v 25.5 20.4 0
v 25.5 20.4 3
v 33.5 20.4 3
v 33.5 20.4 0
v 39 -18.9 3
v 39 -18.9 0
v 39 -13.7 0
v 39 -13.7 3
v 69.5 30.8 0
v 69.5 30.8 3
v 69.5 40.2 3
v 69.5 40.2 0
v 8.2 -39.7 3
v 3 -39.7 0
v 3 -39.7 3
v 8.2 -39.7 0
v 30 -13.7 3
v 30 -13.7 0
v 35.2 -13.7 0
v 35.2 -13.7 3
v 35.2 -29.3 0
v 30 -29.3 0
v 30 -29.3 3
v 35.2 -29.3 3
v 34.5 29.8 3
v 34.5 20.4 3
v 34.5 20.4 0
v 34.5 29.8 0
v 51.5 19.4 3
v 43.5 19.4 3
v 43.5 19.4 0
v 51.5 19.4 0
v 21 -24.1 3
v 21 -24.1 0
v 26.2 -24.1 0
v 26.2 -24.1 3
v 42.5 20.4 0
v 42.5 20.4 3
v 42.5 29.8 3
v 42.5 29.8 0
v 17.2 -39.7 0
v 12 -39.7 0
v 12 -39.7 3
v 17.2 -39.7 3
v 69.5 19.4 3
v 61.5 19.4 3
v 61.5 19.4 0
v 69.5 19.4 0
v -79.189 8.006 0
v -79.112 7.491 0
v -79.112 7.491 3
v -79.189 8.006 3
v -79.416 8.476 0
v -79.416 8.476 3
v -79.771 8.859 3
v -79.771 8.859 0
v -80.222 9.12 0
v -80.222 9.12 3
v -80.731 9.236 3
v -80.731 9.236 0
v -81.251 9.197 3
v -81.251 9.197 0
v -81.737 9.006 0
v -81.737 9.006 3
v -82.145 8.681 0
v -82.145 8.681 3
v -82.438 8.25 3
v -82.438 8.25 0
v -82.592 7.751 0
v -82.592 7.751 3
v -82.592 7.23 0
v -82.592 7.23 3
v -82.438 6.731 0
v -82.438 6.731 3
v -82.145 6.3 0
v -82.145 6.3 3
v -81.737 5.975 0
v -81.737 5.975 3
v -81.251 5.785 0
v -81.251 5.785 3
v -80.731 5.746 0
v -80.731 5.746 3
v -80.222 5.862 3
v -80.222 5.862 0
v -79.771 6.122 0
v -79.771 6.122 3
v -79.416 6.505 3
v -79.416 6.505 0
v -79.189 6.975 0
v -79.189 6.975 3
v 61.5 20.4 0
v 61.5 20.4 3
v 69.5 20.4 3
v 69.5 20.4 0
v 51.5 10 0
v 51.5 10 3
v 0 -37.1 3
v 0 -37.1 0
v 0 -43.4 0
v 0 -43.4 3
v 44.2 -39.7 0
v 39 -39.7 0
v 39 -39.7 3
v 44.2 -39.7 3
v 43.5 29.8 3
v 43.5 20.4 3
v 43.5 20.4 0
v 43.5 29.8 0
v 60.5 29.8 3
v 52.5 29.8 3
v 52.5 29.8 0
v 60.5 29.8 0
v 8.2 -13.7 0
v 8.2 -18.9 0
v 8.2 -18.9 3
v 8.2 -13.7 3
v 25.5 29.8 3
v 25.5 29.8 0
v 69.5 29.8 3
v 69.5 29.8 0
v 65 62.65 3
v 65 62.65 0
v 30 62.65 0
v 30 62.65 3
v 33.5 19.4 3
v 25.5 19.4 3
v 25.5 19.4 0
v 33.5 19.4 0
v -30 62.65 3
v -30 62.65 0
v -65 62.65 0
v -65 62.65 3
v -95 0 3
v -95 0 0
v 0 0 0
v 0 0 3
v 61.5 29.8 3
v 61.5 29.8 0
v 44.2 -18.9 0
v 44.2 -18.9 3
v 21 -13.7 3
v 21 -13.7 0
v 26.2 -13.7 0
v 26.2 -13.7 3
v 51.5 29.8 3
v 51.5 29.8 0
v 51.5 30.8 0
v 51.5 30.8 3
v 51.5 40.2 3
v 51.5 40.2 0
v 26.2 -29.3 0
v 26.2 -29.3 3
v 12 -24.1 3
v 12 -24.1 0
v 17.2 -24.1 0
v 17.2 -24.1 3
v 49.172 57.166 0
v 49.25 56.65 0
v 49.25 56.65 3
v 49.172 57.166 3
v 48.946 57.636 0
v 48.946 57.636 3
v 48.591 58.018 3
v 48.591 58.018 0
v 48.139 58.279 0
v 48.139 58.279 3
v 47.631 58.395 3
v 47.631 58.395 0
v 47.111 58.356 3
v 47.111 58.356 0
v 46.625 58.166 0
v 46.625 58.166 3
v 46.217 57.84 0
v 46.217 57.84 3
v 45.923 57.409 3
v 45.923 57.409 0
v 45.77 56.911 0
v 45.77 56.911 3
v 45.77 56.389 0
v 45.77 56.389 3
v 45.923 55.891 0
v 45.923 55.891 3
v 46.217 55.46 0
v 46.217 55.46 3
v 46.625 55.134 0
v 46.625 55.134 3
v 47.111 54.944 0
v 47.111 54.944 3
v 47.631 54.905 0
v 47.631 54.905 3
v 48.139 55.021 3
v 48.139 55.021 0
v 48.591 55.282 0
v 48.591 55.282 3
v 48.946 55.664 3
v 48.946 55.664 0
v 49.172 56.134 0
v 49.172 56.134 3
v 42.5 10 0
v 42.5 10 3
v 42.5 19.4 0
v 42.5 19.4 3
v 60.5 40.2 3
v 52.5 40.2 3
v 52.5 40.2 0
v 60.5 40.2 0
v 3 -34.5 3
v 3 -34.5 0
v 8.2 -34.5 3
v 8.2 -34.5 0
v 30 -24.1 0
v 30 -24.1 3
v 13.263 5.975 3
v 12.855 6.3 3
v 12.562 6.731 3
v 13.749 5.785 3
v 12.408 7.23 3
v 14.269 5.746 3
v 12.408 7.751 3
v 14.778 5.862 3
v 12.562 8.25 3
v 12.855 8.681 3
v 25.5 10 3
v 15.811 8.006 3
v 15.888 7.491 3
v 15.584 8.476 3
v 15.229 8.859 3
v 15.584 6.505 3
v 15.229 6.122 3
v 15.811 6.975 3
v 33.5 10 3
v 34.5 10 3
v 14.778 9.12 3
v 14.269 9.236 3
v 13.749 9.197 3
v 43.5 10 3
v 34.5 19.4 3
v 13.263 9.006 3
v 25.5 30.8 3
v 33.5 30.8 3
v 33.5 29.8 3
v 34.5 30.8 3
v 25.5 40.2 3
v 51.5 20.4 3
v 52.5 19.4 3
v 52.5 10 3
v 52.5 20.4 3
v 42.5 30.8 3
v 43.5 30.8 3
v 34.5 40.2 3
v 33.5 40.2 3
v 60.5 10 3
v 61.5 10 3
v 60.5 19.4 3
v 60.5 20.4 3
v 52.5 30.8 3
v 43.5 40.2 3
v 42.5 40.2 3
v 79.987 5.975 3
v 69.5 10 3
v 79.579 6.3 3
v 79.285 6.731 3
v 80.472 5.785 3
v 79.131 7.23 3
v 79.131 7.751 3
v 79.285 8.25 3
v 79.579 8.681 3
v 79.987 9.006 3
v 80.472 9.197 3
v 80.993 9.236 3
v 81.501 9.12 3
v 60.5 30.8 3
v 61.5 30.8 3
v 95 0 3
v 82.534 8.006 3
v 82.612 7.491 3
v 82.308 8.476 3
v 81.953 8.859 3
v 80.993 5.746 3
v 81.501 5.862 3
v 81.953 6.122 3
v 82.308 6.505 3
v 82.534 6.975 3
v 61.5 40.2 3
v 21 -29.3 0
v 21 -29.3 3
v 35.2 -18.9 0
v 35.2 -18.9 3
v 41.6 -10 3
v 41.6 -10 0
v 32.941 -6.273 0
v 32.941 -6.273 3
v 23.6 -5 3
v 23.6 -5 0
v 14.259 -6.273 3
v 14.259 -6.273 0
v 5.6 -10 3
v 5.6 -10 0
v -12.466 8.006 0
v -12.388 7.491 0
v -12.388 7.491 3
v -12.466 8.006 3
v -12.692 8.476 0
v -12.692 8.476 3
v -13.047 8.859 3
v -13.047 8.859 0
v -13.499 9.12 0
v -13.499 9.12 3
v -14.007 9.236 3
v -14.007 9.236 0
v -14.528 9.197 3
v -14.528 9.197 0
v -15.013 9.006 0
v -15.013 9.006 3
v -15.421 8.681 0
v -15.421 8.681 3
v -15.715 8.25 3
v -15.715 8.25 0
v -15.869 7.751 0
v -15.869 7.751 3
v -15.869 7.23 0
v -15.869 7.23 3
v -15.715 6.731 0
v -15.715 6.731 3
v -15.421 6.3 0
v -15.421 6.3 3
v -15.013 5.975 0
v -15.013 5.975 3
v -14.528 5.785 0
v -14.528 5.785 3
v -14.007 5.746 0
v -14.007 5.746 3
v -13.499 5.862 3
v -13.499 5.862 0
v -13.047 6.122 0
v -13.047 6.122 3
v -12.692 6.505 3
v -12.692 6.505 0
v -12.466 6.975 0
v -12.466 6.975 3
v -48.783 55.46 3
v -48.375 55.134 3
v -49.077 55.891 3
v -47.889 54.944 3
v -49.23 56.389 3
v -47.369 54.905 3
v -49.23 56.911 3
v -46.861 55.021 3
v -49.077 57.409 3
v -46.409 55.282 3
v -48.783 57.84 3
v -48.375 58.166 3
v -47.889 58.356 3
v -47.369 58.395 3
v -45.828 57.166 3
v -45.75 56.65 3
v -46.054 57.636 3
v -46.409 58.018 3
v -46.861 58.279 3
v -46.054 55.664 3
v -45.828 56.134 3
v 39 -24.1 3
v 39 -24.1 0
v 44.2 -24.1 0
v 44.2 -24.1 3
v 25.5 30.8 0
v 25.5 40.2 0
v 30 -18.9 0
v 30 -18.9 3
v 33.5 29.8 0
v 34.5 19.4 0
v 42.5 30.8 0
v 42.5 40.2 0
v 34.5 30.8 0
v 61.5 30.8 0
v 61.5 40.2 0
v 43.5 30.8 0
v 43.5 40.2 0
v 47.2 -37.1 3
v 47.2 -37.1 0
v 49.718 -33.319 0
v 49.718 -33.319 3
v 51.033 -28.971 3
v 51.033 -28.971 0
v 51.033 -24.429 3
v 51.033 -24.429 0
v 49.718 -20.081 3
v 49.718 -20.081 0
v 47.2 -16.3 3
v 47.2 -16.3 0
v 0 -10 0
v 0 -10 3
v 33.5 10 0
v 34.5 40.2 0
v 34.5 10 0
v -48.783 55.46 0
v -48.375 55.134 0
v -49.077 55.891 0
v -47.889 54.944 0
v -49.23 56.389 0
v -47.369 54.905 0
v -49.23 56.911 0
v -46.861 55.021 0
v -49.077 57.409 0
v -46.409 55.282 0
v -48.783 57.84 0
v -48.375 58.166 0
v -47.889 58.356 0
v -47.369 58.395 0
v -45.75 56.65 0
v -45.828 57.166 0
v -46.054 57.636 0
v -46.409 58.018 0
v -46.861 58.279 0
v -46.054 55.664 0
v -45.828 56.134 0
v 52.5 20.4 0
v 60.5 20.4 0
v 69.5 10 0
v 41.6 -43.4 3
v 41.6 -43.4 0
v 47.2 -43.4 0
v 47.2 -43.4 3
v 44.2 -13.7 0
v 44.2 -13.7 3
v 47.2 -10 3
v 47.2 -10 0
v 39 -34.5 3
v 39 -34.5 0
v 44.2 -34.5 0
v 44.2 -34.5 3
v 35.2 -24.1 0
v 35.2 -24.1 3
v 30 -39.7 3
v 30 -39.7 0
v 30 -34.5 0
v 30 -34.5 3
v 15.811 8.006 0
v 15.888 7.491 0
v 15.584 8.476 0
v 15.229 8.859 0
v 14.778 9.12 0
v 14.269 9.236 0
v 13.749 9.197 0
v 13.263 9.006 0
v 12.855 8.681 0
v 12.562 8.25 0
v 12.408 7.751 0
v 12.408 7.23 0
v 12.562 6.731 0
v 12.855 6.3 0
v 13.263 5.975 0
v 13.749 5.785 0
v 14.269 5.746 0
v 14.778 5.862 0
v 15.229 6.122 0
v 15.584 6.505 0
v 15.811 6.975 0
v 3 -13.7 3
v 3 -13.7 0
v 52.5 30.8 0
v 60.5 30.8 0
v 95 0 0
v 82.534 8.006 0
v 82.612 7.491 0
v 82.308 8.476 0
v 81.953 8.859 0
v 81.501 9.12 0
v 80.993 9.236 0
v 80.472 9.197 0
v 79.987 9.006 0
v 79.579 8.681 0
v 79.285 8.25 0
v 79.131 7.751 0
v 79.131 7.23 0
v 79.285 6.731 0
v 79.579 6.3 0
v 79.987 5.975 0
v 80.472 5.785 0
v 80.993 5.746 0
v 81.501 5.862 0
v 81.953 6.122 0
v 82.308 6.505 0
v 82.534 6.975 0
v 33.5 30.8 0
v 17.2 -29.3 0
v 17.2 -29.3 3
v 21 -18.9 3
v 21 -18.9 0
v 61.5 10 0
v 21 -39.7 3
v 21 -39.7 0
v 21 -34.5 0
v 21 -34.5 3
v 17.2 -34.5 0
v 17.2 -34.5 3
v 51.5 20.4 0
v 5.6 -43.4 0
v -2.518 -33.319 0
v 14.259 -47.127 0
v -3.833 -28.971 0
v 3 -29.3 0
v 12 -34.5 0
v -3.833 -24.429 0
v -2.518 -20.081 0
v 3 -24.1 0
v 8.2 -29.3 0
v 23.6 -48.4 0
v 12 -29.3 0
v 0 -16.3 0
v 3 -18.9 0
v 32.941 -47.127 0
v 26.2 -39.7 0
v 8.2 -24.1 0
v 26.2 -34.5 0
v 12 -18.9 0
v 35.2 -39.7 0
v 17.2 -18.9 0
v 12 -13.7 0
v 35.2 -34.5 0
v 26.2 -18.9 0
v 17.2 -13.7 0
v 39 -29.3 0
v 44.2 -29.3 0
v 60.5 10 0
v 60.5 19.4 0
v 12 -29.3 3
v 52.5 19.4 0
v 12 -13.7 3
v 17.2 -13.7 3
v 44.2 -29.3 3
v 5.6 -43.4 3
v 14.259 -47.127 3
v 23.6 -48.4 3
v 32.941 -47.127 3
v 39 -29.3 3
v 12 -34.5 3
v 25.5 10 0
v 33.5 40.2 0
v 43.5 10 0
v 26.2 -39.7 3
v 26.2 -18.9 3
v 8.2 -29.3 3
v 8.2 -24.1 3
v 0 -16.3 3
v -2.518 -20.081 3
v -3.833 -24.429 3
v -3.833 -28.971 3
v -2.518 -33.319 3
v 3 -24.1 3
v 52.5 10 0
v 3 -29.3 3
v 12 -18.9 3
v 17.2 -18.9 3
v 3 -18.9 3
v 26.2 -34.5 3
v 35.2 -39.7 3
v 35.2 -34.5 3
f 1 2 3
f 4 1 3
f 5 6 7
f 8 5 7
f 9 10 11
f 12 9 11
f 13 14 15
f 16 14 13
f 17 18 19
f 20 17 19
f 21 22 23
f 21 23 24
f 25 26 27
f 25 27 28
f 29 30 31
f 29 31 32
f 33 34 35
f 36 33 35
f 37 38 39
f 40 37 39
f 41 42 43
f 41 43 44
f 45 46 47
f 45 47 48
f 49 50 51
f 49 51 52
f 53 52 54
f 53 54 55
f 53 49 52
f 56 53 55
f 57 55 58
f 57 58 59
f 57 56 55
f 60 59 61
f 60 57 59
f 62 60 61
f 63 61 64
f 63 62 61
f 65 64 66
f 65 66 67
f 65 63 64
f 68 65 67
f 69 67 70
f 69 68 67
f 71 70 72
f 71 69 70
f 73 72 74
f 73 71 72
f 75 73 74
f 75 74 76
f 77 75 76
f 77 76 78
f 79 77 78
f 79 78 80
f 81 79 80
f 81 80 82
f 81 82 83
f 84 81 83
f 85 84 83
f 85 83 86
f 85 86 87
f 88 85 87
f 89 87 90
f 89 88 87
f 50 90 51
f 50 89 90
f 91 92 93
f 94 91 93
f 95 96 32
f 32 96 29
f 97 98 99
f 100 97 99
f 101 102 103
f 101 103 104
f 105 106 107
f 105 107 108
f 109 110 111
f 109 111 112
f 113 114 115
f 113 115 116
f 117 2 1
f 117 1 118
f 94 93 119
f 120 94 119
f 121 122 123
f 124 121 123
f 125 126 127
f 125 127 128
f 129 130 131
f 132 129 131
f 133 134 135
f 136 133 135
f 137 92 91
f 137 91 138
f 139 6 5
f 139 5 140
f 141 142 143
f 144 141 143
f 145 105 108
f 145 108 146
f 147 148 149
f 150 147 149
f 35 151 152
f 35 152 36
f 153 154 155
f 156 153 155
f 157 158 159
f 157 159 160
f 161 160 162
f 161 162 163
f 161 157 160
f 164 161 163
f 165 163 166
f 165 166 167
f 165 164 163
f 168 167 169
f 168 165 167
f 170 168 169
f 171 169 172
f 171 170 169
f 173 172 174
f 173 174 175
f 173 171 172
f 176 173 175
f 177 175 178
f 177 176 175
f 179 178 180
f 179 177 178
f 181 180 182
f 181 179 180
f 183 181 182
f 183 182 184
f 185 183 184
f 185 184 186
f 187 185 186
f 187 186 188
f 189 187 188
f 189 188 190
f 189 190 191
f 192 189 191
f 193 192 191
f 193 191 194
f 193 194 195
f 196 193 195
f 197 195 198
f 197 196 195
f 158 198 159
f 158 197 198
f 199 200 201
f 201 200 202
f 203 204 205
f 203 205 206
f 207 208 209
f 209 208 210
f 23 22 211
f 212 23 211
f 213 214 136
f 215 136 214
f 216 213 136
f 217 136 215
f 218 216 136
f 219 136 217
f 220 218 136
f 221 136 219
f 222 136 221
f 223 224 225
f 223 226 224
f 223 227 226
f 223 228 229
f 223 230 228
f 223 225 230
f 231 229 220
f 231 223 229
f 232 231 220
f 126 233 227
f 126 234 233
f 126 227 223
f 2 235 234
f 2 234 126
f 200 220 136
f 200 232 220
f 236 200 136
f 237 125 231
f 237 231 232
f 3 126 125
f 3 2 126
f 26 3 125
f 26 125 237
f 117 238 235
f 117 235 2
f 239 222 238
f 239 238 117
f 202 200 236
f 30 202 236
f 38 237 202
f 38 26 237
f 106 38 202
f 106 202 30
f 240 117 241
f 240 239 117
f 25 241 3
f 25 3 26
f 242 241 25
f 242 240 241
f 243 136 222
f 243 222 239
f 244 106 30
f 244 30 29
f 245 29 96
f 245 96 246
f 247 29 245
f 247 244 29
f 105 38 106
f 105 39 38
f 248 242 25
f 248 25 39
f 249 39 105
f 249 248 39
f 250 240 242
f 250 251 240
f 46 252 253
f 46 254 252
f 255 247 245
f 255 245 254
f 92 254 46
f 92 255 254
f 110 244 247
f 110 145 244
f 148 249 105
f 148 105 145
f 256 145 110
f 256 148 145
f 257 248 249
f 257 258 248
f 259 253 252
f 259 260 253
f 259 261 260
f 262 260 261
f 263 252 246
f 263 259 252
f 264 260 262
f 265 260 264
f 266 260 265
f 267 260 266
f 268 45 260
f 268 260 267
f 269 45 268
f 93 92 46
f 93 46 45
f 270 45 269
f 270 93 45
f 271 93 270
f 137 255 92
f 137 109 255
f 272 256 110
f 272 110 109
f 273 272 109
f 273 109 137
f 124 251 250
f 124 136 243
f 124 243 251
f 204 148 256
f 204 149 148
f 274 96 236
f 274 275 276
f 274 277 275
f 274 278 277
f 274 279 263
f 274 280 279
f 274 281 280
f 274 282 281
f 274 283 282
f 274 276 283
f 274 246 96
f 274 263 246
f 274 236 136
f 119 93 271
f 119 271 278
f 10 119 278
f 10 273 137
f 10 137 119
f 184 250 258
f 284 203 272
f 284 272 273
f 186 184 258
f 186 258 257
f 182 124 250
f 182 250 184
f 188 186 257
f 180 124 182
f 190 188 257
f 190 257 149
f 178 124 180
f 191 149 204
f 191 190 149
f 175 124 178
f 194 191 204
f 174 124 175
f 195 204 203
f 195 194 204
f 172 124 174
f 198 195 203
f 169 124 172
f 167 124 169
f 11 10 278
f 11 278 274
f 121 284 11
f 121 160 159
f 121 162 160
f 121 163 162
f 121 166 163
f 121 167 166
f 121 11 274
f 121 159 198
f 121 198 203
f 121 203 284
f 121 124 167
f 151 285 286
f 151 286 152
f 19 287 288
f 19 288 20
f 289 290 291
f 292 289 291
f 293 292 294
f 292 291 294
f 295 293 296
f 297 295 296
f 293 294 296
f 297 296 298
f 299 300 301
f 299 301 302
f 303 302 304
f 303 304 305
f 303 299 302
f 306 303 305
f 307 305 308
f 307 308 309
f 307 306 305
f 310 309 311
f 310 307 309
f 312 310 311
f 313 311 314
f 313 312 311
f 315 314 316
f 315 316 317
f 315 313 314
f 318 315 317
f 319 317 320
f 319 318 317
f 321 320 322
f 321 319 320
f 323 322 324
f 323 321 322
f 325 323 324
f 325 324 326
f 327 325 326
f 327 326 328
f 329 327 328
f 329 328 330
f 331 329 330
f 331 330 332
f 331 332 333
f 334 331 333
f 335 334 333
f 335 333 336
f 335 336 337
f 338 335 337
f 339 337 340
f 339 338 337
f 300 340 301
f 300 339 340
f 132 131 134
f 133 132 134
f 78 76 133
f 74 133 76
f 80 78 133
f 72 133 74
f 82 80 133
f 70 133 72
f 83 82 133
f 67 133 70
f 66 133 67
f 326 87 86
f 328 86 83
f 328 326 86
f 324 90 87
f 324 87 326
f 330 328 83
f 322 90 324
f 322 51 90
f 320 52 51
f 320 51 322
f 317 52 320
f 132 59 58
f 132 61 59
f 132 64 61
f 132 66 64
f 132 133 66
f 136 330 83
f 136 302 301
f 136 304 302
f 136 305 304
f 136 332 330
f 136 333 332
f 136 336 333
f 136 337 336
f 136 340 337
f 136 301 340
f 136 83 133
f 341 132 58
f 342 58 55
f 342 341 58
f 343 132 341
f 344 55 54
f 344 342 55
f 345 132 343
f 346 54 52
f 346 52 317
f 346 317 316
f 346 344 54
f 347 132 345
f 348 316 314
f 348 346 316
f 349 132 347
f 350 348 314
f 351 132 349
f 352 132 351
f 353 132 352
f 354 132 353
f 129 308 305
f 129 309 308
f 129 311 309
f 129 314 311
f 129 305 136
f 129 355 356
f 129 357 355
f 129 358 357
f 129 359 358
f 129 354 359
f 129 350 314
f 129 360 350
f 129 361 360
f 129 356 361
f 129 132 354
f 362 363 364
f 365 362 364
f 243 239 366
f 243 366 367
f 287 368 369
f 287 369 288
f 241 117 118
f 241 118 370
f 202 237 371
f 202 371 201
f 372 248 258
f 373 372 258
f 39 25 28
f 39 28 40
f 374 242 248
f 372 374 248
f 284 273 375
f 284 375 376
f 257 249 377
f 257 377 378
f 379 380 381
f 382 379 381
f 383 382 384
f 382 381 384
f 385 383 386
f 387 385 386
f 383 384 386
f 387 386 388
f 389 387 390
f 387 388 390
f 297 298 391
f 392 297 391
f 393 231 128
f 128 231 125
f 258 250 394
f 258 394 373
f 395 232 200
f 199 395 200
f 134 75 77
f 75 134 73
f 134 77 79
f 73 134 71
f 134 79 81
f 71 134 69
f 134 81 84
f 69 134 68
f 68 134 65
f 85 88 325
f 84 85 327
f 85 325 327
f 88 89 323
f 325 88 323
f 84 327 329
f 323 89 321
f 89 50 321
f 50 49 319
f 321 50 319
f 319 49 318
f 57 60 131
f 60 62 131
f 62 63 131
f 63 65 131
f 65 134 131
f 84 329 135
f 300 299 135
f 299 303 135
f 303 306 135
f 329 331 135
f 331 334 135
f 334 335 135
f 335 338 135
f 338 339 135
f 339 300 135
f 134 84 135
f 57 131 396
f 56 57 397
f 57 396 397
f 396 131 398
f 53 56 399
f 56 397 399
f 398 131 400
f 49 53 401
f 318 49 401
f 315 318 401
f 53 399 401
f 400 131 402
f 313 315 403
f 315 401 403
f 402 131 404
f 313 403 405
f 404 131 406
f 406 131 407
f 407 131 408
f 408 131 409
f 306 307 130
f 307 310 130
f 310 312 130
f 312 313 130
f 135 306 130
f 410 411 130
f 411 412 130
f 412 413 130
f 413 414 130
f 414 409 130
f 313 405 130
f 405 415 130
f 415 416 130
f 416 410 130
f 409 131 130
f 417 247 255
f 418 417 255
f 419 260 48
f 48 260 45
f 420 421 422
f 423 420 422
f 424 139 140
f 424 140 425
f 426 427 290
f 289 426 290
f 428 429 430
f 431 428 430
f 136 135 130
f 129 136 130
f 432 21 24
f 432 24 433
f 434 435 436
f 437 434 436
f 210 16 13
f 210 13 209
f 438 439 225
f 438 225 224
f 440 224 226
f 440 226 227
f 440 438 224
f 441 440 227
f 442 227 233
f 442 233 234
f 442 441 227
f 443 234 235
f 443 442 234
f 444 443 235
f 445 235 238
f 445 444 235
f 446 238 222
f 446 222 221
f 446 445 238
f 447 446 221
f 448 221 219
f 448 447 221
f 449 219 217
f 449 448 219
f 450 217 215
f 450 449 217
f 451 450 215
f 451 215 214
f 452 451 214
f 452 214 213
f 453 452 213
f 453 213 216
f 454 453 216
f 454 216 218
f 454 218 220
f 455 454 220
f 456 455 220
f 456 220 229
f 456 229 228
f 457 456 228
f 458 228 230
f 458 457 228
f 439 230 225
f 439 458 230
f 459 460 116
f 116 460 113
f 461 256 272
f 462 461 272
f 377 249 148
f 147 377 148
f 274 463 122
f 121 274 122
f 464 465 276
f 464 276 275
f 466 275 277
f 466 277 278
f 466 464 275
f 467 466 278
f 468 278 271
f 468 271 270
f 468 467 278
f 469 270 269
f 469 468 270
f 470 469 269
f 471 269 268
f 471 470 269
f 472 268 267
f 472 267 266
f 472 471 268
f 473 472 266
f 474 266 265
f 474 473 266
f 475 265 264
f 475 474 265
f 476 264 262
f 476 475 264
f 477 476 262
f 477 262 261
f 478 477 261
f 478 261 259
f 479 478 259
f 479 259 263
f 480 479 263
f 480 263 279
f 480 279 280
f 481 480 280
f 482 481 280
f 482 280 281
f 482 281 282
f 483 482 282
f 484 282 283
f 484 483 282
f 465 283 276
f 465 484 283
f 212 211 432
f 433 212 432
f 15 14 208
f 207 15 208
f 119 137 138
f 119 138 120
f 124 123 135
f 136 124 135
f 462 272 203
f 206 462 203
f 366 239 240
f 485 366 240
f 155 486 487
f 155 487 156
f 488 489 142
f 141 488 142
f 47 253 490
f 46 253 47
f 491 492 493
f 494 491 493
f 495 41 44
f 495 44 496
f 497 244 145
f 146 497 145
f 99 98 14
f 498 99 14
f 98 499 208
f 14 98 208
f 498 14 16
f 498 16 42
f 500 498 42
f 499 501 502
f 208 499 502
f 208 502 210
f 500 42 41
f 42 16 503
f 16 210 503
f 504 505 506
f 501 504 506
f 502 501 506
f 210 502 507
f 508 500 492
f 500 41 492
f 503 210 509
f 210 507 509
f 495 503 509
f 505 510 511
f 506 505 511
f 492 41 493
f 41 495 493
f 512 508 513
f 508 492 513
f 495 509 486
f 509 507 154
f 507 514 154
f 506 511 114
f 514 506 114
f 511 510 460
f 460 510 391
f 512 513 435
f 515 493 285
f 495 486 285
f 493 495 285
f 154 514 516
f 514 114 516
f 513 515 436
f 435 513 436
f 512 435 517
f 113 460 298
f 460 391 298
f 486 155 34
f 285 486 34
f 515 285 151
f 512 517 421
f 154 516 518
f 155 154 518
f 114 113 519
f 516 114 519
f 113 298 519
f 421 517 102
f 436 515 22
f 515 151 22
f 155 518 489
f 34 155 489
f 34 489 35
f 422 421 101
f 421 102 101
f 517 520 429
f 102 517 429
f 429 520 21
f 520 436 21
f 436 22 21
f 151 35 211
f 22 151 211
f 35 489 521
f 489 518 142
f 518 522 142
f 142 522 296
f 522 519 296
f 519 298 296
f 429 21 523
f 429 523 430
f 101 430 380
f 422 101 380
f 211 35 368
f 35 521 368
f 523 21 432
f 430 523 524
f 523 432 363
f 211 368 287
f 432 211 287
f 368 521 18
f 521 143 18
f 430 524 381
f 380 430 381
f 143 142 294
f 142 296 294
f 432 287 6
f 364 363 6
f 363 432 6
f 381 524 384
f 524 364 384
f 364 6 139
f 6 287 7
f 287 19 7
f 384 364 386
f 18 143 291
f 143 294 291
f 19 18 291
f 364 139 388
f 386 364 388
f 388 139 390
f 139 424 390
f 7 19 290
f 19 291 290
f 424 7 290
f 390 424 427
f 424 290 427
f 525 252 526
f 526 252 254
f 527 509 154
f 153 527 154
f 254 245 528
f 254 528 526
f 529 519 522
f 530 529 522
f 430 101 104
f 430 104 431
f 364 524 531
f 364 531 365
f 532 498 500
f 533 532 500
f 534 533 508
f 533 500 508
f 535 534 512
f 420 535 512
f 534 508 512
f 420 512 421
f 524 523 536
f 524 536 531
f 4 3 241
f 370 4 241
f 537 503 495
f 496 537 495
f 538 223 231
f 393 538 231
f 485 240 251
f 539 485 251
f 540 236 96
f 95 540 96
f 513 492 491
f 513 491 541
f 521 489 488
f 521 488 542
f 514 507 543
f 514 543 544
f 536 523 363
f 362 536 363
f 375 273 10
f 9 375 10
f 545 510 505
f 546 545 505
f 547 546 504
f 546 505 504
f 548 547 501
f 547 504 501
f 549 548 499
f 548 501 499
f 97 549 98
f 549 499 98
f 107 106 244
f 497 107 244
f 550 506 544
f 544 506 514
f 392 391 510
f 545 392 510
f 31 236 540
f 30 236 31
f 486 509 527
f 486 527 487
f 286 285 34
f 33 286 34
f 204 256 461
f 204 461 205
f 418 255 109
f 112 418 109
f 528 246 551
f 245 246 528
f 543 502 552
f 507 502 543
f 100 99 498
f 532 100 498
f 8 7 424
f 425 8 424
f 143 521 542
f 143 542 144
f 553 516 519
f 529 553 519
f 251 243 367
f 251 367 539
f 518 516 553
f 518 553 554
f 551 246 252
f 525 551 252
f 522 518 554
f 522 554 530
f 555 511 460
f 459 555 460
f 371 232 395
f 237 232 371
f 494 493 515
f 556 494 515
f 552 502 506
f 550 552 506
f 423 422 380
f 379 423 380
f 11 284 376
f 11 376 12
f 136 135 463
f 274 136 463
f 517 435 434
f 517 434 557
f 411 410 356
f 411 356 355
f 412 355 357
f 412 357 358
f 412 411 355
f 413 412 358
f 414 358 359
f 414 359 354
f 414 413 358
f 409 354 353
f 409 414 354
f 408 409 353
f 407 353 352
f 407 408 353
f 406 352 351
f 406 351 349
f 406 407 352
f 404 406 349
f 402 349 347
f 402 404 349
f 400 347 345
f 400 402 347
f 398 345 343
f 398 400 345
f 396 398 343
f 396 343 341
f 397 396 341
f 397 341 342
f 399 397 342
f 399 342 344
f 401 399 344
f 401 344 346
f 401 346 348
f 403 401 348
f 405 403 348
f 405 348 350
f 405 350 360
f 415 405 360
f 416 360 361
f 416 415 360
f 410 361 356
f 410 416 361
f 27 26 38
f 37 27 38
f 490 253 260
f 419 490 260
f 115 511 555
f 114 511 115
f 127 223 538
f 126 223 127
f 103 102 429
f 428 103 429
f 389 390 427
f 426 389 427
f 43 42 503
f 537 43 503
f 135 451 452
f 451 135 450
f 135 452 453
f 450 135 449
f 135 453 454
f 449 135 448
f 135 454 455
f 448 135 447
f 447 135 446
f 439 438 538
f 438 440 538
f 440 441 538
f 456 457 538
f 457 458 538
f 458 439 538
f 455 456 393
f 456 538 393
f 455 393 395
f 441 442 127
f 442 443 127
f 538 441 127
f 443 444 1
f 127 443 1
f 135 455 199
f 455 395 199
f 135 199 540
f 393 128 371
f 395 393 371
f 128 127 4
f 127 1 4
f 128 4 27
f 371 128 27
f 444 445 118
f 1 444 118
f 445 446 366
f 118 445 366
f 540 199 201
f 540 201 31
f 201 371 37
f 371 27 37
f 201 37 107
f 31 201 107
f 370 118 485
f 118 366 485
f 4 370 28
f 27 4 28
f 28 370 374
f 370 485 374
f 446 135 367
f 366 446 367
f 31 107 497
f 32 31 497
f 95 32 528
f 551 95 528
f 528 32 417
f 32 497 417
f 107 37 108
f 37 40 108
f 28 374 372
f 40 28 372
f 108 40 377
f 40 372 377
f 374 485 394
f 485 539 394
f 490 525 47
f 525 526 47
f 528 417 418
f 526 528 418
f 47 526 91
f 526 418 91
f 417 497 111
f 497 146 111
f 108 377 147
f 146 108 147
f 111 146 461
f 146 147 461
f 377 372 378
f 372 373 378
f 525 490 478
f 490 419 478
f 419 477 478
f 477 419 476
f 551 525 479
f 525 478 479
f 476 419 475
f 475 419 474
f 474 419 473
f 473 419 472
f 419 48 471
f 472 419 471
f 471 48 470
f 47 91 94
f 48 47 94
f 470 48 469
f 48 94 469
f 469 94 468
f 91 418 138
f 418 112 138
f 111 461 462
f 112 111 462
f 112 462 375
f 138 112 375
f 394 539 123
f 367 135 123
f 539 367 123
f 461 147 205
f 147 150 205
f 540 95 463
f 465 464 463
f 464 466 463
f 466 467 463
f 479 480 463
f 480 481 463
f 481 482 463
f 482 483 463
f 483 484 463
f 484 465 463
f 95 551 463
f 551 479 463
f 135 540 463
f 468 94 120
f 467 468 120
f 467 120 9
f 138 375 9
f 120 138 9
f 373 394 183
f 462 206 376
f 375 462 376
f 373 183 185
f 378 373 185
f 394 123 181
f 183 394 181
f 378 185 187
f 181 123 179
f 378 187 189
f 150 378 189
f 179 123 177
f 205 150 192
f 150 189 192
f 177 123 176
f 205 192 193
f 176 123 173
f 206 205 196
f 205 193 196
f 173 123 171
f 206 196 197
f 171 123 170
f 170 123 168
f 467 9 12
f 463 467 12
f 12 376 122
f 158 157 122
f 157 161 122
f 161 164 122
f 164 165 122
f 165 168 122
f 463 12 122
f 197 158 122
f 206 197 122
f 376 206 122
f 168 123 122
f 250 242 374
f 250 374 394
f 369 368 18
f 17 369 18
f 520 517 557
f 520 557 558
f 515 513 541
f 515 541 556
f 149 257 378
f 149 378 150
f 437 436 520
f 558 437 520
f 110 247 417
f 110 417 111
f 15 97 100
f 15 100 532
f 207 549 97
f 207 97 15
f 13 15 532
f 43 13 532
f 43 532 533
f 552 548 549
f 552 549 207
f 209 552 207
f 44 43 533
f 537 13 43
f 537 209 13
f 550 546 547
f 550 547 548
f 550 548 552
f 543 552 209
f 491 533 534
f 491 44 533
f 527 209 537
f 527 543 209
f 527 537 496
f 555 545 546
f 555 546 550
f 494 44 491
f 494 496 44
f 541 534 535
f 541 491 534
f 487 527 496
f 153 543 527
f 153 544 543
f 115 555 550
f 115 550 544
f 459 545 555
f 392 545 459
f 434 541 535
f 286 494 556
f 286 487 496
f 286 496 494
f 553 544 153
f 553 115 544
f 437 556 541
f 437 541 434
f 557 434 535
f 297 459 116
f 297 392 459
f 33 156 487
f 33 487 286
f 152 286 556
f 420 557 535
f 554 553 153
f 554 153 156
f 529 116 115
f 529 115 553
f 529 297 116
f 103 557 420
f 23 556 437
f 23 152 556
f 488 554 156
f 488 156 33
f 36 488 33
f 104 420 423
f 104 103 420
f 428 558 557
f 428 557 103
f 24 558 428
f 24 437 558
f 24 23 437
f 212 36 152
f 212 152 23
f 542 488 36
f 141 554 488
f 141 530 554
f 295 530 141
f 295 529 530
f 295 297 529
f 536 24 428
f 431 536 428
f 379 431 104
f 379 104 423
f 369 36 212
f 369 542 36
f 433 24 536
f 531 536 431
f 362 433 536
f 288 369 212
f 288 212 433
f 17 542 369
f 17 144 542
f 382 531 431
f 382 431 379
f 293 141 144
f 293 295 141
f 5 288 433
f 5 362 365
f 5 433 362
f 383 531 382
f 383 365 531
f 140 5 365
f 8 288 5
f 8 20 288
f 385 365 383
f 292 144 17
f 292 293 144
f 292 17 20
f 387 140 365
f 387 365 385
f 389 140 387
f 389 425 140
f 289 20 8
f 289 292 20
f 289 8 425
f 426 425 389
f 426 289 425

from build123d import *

# Parameters (mm, degrees)
F0_R     = 1.75
F0_W     = 5.2
F0_H     = 5.2
F1_DEPTH = 3
F2_W     = 8
F2_H     = 9.4
F3_DEPTH = 3.001


with BuildPart() as f1:
    # F0 (on Top) → F1 (new body)
    with BuildSketch(Plane.XY):
        Polygon((-95, 0), (0, 0), (-30, 62.65), (-65, 62.65), align=None)
        with Locations((-80.861745, 7.490643)):
            Circle(F0_R, mode=Mode.SUBTRACT)
        with Locations((-14.138255, 7.490643)):
            Circle(F0_R, mode=Mode.SUBTRACT)
        with Locations((-47.5, 56.65)):
            Circle(F0_R, mode=Mode.SUBTRACT)
        Polygon((30, 62.65), (0, 0), (95, 0), (65, 62.65), align=None)
        with Locations((14.138255, 7.490643)):
            Circle(F0_R, mode=Mode.SUBTRACT)
        with Locations((80.861745, 7.490643)):
            Circle(F0_R, mode=Mode.SUBTRACT)
        with Locations((47.5, 56.65)):
            Circle(F0_R, mode=Mode.SUBTRACT)
        Polygon((5.6, -10), (0, -10), (0, -16.3), (0, -37.1), (0, -43.4), (5.6, -43.4), (41.6, -43.4), (47.2, -43.4), (47.2, -37.1), (47.2, -16.3), (47.2, -10), (41.6, -10), align=None)
        with Locations((5.6, -37.1)):
            Rectangle(F0_W, F0_H, mode=Mode.SUBTRACT)
        with Locations((14.6, -37.1)):
            Rectangle(F0_W, F0_H, mode=Mode.SUBTRACT)
        with Locations((23.6, -37.1)):
            Rectangle(F0_W, F0_H, mode=Mode.SUBTRACT)
        with Locations((32.6, -37.1)):
            Rectangle(F0_W, F0_H, mode=Mode.SUBTRACT)
        with Locations((41.6, -37.1)):
            Rectangle(F0_W, F0_H, mode=Mode.SUBTRACT)
        with Locations((5.6, -26.7)):
            Rectangle(F0_W, F0_H, mode=Mode.SUBTRACT)
        with Locations((14.6, -26.7)):
            Rectangle(F0_W, F0_H, mode=Mode.SUBTRACT)
        with Locations((23.6, -26.7)):
            Rectangle(F0_W, F0_H, mode=Mode.SUBTRACT)
        with Locations((32.6, -26.7)):
            Rectangle(F0_W, F0_H, mode=Mode.SUBTRACT)
        with Locations((41.6, -26.7)):
            Rectangle(F0_W, F0_H, mode=Mode.SUBTRACT)
        with Locations((5.6, -16.3)):
            Rectangle(F0_W, F0_H, mode=Mode.SUBTRACT)
        with Locations((14.6, -16.3)):
            Rectangle(F0_W, F0_H, mode=Mode.SUBTRACT)
        with Locations((23.6, -16.3)):
            Rectangle(F0_W, F0_H, mode=Mode.SUBTRACT)
        with Locations((32.6, -16.3)):
            Rectangle(F0_W, F0_H, mode=Mode.SUBTRACT)
        with Locations((41.6, -16.3)):
            Rectangle(F0_W, F0_H, mode=Mode.SUBTRACT)
        with BuildLine():
            Line((41.6, -43.4), (5.6, -43.4))
            ThreePointArc((5.6, -43.4), (23.6, -48.4), (41.6, -43.4))
        make_face()
        with BuildLine():
            ThreePointArc((47.2, -37.1), (51.2, -26.7), (47.2, -16.3))
            Line((47.2, -16.3), (47.2, -37.1))
        make_face()
        with BuildLine():
            ThreePointArc((41.6, -10), (23.6, -5), (5.6, -10))
            Line((5.6, -10), (41.6, -10))
        make_face()
        with BuildLine():
            Line((0, -37.1), (0, -16.3))
            ThreePointArc((0, -16.3), (-4, -26.7), (0, -37.1))
        make_face()
    extrude(amount=F1_DEPTH)

    # F2 (on face) → F3 (cut, through all)
    with BuildSketch(Plane.XY.offset(3)):
        with Locations((29.5, 14.7)):
            Rectangle(F2_W, F2_H)
        with Locations((29.5, 25.1)):
            Rectangle(F2_W, F2_H)
        with Locations((29.5, 35.5)):
            Rectangle(F2_W, F2_H)
        with Locations((38.5, 14.7)):
            Rectangle(F2_W, F2_H)
        with Locations((38.5, 25.1)):
            Rectangle(F2_W, F2_H)
        with Locations((38.5, 35.5)):
            Rectangle(F2_W, F2_H)
        with Locations((47.5, 14.7)):
            Rectangle(F2_W, F2_H)
        with Locations((47.5, 25.1)):
            Rectangle(F2_W, F2_H)
        with Locations((47.5, 35.5)):
            Rectangle(F2_W, F2_H)
        with Locations((56.5, 14.7)):
            Rectangle(F2_W, F2_H)
        with Locations((56.5, 25.1)):
            Rectangle(F2_W, F2_H)
        with Locations((56.5, 35.5)):
            Rectangle(F2_W, F2_H)
        with Locations((65.5, 14.7)):
            Rectangle(F2_W, F2_H)
        with Locations((65.5, 25.1)):
            Rectangle(F2_W, F2_H)
        with Locations((65.5, 35.5)):
            Rectangle(F2_W, F2_H)
    extrude(amount=-F3_DEPTH, mode=Mode.SUBTRACT)


solid = f1.part
